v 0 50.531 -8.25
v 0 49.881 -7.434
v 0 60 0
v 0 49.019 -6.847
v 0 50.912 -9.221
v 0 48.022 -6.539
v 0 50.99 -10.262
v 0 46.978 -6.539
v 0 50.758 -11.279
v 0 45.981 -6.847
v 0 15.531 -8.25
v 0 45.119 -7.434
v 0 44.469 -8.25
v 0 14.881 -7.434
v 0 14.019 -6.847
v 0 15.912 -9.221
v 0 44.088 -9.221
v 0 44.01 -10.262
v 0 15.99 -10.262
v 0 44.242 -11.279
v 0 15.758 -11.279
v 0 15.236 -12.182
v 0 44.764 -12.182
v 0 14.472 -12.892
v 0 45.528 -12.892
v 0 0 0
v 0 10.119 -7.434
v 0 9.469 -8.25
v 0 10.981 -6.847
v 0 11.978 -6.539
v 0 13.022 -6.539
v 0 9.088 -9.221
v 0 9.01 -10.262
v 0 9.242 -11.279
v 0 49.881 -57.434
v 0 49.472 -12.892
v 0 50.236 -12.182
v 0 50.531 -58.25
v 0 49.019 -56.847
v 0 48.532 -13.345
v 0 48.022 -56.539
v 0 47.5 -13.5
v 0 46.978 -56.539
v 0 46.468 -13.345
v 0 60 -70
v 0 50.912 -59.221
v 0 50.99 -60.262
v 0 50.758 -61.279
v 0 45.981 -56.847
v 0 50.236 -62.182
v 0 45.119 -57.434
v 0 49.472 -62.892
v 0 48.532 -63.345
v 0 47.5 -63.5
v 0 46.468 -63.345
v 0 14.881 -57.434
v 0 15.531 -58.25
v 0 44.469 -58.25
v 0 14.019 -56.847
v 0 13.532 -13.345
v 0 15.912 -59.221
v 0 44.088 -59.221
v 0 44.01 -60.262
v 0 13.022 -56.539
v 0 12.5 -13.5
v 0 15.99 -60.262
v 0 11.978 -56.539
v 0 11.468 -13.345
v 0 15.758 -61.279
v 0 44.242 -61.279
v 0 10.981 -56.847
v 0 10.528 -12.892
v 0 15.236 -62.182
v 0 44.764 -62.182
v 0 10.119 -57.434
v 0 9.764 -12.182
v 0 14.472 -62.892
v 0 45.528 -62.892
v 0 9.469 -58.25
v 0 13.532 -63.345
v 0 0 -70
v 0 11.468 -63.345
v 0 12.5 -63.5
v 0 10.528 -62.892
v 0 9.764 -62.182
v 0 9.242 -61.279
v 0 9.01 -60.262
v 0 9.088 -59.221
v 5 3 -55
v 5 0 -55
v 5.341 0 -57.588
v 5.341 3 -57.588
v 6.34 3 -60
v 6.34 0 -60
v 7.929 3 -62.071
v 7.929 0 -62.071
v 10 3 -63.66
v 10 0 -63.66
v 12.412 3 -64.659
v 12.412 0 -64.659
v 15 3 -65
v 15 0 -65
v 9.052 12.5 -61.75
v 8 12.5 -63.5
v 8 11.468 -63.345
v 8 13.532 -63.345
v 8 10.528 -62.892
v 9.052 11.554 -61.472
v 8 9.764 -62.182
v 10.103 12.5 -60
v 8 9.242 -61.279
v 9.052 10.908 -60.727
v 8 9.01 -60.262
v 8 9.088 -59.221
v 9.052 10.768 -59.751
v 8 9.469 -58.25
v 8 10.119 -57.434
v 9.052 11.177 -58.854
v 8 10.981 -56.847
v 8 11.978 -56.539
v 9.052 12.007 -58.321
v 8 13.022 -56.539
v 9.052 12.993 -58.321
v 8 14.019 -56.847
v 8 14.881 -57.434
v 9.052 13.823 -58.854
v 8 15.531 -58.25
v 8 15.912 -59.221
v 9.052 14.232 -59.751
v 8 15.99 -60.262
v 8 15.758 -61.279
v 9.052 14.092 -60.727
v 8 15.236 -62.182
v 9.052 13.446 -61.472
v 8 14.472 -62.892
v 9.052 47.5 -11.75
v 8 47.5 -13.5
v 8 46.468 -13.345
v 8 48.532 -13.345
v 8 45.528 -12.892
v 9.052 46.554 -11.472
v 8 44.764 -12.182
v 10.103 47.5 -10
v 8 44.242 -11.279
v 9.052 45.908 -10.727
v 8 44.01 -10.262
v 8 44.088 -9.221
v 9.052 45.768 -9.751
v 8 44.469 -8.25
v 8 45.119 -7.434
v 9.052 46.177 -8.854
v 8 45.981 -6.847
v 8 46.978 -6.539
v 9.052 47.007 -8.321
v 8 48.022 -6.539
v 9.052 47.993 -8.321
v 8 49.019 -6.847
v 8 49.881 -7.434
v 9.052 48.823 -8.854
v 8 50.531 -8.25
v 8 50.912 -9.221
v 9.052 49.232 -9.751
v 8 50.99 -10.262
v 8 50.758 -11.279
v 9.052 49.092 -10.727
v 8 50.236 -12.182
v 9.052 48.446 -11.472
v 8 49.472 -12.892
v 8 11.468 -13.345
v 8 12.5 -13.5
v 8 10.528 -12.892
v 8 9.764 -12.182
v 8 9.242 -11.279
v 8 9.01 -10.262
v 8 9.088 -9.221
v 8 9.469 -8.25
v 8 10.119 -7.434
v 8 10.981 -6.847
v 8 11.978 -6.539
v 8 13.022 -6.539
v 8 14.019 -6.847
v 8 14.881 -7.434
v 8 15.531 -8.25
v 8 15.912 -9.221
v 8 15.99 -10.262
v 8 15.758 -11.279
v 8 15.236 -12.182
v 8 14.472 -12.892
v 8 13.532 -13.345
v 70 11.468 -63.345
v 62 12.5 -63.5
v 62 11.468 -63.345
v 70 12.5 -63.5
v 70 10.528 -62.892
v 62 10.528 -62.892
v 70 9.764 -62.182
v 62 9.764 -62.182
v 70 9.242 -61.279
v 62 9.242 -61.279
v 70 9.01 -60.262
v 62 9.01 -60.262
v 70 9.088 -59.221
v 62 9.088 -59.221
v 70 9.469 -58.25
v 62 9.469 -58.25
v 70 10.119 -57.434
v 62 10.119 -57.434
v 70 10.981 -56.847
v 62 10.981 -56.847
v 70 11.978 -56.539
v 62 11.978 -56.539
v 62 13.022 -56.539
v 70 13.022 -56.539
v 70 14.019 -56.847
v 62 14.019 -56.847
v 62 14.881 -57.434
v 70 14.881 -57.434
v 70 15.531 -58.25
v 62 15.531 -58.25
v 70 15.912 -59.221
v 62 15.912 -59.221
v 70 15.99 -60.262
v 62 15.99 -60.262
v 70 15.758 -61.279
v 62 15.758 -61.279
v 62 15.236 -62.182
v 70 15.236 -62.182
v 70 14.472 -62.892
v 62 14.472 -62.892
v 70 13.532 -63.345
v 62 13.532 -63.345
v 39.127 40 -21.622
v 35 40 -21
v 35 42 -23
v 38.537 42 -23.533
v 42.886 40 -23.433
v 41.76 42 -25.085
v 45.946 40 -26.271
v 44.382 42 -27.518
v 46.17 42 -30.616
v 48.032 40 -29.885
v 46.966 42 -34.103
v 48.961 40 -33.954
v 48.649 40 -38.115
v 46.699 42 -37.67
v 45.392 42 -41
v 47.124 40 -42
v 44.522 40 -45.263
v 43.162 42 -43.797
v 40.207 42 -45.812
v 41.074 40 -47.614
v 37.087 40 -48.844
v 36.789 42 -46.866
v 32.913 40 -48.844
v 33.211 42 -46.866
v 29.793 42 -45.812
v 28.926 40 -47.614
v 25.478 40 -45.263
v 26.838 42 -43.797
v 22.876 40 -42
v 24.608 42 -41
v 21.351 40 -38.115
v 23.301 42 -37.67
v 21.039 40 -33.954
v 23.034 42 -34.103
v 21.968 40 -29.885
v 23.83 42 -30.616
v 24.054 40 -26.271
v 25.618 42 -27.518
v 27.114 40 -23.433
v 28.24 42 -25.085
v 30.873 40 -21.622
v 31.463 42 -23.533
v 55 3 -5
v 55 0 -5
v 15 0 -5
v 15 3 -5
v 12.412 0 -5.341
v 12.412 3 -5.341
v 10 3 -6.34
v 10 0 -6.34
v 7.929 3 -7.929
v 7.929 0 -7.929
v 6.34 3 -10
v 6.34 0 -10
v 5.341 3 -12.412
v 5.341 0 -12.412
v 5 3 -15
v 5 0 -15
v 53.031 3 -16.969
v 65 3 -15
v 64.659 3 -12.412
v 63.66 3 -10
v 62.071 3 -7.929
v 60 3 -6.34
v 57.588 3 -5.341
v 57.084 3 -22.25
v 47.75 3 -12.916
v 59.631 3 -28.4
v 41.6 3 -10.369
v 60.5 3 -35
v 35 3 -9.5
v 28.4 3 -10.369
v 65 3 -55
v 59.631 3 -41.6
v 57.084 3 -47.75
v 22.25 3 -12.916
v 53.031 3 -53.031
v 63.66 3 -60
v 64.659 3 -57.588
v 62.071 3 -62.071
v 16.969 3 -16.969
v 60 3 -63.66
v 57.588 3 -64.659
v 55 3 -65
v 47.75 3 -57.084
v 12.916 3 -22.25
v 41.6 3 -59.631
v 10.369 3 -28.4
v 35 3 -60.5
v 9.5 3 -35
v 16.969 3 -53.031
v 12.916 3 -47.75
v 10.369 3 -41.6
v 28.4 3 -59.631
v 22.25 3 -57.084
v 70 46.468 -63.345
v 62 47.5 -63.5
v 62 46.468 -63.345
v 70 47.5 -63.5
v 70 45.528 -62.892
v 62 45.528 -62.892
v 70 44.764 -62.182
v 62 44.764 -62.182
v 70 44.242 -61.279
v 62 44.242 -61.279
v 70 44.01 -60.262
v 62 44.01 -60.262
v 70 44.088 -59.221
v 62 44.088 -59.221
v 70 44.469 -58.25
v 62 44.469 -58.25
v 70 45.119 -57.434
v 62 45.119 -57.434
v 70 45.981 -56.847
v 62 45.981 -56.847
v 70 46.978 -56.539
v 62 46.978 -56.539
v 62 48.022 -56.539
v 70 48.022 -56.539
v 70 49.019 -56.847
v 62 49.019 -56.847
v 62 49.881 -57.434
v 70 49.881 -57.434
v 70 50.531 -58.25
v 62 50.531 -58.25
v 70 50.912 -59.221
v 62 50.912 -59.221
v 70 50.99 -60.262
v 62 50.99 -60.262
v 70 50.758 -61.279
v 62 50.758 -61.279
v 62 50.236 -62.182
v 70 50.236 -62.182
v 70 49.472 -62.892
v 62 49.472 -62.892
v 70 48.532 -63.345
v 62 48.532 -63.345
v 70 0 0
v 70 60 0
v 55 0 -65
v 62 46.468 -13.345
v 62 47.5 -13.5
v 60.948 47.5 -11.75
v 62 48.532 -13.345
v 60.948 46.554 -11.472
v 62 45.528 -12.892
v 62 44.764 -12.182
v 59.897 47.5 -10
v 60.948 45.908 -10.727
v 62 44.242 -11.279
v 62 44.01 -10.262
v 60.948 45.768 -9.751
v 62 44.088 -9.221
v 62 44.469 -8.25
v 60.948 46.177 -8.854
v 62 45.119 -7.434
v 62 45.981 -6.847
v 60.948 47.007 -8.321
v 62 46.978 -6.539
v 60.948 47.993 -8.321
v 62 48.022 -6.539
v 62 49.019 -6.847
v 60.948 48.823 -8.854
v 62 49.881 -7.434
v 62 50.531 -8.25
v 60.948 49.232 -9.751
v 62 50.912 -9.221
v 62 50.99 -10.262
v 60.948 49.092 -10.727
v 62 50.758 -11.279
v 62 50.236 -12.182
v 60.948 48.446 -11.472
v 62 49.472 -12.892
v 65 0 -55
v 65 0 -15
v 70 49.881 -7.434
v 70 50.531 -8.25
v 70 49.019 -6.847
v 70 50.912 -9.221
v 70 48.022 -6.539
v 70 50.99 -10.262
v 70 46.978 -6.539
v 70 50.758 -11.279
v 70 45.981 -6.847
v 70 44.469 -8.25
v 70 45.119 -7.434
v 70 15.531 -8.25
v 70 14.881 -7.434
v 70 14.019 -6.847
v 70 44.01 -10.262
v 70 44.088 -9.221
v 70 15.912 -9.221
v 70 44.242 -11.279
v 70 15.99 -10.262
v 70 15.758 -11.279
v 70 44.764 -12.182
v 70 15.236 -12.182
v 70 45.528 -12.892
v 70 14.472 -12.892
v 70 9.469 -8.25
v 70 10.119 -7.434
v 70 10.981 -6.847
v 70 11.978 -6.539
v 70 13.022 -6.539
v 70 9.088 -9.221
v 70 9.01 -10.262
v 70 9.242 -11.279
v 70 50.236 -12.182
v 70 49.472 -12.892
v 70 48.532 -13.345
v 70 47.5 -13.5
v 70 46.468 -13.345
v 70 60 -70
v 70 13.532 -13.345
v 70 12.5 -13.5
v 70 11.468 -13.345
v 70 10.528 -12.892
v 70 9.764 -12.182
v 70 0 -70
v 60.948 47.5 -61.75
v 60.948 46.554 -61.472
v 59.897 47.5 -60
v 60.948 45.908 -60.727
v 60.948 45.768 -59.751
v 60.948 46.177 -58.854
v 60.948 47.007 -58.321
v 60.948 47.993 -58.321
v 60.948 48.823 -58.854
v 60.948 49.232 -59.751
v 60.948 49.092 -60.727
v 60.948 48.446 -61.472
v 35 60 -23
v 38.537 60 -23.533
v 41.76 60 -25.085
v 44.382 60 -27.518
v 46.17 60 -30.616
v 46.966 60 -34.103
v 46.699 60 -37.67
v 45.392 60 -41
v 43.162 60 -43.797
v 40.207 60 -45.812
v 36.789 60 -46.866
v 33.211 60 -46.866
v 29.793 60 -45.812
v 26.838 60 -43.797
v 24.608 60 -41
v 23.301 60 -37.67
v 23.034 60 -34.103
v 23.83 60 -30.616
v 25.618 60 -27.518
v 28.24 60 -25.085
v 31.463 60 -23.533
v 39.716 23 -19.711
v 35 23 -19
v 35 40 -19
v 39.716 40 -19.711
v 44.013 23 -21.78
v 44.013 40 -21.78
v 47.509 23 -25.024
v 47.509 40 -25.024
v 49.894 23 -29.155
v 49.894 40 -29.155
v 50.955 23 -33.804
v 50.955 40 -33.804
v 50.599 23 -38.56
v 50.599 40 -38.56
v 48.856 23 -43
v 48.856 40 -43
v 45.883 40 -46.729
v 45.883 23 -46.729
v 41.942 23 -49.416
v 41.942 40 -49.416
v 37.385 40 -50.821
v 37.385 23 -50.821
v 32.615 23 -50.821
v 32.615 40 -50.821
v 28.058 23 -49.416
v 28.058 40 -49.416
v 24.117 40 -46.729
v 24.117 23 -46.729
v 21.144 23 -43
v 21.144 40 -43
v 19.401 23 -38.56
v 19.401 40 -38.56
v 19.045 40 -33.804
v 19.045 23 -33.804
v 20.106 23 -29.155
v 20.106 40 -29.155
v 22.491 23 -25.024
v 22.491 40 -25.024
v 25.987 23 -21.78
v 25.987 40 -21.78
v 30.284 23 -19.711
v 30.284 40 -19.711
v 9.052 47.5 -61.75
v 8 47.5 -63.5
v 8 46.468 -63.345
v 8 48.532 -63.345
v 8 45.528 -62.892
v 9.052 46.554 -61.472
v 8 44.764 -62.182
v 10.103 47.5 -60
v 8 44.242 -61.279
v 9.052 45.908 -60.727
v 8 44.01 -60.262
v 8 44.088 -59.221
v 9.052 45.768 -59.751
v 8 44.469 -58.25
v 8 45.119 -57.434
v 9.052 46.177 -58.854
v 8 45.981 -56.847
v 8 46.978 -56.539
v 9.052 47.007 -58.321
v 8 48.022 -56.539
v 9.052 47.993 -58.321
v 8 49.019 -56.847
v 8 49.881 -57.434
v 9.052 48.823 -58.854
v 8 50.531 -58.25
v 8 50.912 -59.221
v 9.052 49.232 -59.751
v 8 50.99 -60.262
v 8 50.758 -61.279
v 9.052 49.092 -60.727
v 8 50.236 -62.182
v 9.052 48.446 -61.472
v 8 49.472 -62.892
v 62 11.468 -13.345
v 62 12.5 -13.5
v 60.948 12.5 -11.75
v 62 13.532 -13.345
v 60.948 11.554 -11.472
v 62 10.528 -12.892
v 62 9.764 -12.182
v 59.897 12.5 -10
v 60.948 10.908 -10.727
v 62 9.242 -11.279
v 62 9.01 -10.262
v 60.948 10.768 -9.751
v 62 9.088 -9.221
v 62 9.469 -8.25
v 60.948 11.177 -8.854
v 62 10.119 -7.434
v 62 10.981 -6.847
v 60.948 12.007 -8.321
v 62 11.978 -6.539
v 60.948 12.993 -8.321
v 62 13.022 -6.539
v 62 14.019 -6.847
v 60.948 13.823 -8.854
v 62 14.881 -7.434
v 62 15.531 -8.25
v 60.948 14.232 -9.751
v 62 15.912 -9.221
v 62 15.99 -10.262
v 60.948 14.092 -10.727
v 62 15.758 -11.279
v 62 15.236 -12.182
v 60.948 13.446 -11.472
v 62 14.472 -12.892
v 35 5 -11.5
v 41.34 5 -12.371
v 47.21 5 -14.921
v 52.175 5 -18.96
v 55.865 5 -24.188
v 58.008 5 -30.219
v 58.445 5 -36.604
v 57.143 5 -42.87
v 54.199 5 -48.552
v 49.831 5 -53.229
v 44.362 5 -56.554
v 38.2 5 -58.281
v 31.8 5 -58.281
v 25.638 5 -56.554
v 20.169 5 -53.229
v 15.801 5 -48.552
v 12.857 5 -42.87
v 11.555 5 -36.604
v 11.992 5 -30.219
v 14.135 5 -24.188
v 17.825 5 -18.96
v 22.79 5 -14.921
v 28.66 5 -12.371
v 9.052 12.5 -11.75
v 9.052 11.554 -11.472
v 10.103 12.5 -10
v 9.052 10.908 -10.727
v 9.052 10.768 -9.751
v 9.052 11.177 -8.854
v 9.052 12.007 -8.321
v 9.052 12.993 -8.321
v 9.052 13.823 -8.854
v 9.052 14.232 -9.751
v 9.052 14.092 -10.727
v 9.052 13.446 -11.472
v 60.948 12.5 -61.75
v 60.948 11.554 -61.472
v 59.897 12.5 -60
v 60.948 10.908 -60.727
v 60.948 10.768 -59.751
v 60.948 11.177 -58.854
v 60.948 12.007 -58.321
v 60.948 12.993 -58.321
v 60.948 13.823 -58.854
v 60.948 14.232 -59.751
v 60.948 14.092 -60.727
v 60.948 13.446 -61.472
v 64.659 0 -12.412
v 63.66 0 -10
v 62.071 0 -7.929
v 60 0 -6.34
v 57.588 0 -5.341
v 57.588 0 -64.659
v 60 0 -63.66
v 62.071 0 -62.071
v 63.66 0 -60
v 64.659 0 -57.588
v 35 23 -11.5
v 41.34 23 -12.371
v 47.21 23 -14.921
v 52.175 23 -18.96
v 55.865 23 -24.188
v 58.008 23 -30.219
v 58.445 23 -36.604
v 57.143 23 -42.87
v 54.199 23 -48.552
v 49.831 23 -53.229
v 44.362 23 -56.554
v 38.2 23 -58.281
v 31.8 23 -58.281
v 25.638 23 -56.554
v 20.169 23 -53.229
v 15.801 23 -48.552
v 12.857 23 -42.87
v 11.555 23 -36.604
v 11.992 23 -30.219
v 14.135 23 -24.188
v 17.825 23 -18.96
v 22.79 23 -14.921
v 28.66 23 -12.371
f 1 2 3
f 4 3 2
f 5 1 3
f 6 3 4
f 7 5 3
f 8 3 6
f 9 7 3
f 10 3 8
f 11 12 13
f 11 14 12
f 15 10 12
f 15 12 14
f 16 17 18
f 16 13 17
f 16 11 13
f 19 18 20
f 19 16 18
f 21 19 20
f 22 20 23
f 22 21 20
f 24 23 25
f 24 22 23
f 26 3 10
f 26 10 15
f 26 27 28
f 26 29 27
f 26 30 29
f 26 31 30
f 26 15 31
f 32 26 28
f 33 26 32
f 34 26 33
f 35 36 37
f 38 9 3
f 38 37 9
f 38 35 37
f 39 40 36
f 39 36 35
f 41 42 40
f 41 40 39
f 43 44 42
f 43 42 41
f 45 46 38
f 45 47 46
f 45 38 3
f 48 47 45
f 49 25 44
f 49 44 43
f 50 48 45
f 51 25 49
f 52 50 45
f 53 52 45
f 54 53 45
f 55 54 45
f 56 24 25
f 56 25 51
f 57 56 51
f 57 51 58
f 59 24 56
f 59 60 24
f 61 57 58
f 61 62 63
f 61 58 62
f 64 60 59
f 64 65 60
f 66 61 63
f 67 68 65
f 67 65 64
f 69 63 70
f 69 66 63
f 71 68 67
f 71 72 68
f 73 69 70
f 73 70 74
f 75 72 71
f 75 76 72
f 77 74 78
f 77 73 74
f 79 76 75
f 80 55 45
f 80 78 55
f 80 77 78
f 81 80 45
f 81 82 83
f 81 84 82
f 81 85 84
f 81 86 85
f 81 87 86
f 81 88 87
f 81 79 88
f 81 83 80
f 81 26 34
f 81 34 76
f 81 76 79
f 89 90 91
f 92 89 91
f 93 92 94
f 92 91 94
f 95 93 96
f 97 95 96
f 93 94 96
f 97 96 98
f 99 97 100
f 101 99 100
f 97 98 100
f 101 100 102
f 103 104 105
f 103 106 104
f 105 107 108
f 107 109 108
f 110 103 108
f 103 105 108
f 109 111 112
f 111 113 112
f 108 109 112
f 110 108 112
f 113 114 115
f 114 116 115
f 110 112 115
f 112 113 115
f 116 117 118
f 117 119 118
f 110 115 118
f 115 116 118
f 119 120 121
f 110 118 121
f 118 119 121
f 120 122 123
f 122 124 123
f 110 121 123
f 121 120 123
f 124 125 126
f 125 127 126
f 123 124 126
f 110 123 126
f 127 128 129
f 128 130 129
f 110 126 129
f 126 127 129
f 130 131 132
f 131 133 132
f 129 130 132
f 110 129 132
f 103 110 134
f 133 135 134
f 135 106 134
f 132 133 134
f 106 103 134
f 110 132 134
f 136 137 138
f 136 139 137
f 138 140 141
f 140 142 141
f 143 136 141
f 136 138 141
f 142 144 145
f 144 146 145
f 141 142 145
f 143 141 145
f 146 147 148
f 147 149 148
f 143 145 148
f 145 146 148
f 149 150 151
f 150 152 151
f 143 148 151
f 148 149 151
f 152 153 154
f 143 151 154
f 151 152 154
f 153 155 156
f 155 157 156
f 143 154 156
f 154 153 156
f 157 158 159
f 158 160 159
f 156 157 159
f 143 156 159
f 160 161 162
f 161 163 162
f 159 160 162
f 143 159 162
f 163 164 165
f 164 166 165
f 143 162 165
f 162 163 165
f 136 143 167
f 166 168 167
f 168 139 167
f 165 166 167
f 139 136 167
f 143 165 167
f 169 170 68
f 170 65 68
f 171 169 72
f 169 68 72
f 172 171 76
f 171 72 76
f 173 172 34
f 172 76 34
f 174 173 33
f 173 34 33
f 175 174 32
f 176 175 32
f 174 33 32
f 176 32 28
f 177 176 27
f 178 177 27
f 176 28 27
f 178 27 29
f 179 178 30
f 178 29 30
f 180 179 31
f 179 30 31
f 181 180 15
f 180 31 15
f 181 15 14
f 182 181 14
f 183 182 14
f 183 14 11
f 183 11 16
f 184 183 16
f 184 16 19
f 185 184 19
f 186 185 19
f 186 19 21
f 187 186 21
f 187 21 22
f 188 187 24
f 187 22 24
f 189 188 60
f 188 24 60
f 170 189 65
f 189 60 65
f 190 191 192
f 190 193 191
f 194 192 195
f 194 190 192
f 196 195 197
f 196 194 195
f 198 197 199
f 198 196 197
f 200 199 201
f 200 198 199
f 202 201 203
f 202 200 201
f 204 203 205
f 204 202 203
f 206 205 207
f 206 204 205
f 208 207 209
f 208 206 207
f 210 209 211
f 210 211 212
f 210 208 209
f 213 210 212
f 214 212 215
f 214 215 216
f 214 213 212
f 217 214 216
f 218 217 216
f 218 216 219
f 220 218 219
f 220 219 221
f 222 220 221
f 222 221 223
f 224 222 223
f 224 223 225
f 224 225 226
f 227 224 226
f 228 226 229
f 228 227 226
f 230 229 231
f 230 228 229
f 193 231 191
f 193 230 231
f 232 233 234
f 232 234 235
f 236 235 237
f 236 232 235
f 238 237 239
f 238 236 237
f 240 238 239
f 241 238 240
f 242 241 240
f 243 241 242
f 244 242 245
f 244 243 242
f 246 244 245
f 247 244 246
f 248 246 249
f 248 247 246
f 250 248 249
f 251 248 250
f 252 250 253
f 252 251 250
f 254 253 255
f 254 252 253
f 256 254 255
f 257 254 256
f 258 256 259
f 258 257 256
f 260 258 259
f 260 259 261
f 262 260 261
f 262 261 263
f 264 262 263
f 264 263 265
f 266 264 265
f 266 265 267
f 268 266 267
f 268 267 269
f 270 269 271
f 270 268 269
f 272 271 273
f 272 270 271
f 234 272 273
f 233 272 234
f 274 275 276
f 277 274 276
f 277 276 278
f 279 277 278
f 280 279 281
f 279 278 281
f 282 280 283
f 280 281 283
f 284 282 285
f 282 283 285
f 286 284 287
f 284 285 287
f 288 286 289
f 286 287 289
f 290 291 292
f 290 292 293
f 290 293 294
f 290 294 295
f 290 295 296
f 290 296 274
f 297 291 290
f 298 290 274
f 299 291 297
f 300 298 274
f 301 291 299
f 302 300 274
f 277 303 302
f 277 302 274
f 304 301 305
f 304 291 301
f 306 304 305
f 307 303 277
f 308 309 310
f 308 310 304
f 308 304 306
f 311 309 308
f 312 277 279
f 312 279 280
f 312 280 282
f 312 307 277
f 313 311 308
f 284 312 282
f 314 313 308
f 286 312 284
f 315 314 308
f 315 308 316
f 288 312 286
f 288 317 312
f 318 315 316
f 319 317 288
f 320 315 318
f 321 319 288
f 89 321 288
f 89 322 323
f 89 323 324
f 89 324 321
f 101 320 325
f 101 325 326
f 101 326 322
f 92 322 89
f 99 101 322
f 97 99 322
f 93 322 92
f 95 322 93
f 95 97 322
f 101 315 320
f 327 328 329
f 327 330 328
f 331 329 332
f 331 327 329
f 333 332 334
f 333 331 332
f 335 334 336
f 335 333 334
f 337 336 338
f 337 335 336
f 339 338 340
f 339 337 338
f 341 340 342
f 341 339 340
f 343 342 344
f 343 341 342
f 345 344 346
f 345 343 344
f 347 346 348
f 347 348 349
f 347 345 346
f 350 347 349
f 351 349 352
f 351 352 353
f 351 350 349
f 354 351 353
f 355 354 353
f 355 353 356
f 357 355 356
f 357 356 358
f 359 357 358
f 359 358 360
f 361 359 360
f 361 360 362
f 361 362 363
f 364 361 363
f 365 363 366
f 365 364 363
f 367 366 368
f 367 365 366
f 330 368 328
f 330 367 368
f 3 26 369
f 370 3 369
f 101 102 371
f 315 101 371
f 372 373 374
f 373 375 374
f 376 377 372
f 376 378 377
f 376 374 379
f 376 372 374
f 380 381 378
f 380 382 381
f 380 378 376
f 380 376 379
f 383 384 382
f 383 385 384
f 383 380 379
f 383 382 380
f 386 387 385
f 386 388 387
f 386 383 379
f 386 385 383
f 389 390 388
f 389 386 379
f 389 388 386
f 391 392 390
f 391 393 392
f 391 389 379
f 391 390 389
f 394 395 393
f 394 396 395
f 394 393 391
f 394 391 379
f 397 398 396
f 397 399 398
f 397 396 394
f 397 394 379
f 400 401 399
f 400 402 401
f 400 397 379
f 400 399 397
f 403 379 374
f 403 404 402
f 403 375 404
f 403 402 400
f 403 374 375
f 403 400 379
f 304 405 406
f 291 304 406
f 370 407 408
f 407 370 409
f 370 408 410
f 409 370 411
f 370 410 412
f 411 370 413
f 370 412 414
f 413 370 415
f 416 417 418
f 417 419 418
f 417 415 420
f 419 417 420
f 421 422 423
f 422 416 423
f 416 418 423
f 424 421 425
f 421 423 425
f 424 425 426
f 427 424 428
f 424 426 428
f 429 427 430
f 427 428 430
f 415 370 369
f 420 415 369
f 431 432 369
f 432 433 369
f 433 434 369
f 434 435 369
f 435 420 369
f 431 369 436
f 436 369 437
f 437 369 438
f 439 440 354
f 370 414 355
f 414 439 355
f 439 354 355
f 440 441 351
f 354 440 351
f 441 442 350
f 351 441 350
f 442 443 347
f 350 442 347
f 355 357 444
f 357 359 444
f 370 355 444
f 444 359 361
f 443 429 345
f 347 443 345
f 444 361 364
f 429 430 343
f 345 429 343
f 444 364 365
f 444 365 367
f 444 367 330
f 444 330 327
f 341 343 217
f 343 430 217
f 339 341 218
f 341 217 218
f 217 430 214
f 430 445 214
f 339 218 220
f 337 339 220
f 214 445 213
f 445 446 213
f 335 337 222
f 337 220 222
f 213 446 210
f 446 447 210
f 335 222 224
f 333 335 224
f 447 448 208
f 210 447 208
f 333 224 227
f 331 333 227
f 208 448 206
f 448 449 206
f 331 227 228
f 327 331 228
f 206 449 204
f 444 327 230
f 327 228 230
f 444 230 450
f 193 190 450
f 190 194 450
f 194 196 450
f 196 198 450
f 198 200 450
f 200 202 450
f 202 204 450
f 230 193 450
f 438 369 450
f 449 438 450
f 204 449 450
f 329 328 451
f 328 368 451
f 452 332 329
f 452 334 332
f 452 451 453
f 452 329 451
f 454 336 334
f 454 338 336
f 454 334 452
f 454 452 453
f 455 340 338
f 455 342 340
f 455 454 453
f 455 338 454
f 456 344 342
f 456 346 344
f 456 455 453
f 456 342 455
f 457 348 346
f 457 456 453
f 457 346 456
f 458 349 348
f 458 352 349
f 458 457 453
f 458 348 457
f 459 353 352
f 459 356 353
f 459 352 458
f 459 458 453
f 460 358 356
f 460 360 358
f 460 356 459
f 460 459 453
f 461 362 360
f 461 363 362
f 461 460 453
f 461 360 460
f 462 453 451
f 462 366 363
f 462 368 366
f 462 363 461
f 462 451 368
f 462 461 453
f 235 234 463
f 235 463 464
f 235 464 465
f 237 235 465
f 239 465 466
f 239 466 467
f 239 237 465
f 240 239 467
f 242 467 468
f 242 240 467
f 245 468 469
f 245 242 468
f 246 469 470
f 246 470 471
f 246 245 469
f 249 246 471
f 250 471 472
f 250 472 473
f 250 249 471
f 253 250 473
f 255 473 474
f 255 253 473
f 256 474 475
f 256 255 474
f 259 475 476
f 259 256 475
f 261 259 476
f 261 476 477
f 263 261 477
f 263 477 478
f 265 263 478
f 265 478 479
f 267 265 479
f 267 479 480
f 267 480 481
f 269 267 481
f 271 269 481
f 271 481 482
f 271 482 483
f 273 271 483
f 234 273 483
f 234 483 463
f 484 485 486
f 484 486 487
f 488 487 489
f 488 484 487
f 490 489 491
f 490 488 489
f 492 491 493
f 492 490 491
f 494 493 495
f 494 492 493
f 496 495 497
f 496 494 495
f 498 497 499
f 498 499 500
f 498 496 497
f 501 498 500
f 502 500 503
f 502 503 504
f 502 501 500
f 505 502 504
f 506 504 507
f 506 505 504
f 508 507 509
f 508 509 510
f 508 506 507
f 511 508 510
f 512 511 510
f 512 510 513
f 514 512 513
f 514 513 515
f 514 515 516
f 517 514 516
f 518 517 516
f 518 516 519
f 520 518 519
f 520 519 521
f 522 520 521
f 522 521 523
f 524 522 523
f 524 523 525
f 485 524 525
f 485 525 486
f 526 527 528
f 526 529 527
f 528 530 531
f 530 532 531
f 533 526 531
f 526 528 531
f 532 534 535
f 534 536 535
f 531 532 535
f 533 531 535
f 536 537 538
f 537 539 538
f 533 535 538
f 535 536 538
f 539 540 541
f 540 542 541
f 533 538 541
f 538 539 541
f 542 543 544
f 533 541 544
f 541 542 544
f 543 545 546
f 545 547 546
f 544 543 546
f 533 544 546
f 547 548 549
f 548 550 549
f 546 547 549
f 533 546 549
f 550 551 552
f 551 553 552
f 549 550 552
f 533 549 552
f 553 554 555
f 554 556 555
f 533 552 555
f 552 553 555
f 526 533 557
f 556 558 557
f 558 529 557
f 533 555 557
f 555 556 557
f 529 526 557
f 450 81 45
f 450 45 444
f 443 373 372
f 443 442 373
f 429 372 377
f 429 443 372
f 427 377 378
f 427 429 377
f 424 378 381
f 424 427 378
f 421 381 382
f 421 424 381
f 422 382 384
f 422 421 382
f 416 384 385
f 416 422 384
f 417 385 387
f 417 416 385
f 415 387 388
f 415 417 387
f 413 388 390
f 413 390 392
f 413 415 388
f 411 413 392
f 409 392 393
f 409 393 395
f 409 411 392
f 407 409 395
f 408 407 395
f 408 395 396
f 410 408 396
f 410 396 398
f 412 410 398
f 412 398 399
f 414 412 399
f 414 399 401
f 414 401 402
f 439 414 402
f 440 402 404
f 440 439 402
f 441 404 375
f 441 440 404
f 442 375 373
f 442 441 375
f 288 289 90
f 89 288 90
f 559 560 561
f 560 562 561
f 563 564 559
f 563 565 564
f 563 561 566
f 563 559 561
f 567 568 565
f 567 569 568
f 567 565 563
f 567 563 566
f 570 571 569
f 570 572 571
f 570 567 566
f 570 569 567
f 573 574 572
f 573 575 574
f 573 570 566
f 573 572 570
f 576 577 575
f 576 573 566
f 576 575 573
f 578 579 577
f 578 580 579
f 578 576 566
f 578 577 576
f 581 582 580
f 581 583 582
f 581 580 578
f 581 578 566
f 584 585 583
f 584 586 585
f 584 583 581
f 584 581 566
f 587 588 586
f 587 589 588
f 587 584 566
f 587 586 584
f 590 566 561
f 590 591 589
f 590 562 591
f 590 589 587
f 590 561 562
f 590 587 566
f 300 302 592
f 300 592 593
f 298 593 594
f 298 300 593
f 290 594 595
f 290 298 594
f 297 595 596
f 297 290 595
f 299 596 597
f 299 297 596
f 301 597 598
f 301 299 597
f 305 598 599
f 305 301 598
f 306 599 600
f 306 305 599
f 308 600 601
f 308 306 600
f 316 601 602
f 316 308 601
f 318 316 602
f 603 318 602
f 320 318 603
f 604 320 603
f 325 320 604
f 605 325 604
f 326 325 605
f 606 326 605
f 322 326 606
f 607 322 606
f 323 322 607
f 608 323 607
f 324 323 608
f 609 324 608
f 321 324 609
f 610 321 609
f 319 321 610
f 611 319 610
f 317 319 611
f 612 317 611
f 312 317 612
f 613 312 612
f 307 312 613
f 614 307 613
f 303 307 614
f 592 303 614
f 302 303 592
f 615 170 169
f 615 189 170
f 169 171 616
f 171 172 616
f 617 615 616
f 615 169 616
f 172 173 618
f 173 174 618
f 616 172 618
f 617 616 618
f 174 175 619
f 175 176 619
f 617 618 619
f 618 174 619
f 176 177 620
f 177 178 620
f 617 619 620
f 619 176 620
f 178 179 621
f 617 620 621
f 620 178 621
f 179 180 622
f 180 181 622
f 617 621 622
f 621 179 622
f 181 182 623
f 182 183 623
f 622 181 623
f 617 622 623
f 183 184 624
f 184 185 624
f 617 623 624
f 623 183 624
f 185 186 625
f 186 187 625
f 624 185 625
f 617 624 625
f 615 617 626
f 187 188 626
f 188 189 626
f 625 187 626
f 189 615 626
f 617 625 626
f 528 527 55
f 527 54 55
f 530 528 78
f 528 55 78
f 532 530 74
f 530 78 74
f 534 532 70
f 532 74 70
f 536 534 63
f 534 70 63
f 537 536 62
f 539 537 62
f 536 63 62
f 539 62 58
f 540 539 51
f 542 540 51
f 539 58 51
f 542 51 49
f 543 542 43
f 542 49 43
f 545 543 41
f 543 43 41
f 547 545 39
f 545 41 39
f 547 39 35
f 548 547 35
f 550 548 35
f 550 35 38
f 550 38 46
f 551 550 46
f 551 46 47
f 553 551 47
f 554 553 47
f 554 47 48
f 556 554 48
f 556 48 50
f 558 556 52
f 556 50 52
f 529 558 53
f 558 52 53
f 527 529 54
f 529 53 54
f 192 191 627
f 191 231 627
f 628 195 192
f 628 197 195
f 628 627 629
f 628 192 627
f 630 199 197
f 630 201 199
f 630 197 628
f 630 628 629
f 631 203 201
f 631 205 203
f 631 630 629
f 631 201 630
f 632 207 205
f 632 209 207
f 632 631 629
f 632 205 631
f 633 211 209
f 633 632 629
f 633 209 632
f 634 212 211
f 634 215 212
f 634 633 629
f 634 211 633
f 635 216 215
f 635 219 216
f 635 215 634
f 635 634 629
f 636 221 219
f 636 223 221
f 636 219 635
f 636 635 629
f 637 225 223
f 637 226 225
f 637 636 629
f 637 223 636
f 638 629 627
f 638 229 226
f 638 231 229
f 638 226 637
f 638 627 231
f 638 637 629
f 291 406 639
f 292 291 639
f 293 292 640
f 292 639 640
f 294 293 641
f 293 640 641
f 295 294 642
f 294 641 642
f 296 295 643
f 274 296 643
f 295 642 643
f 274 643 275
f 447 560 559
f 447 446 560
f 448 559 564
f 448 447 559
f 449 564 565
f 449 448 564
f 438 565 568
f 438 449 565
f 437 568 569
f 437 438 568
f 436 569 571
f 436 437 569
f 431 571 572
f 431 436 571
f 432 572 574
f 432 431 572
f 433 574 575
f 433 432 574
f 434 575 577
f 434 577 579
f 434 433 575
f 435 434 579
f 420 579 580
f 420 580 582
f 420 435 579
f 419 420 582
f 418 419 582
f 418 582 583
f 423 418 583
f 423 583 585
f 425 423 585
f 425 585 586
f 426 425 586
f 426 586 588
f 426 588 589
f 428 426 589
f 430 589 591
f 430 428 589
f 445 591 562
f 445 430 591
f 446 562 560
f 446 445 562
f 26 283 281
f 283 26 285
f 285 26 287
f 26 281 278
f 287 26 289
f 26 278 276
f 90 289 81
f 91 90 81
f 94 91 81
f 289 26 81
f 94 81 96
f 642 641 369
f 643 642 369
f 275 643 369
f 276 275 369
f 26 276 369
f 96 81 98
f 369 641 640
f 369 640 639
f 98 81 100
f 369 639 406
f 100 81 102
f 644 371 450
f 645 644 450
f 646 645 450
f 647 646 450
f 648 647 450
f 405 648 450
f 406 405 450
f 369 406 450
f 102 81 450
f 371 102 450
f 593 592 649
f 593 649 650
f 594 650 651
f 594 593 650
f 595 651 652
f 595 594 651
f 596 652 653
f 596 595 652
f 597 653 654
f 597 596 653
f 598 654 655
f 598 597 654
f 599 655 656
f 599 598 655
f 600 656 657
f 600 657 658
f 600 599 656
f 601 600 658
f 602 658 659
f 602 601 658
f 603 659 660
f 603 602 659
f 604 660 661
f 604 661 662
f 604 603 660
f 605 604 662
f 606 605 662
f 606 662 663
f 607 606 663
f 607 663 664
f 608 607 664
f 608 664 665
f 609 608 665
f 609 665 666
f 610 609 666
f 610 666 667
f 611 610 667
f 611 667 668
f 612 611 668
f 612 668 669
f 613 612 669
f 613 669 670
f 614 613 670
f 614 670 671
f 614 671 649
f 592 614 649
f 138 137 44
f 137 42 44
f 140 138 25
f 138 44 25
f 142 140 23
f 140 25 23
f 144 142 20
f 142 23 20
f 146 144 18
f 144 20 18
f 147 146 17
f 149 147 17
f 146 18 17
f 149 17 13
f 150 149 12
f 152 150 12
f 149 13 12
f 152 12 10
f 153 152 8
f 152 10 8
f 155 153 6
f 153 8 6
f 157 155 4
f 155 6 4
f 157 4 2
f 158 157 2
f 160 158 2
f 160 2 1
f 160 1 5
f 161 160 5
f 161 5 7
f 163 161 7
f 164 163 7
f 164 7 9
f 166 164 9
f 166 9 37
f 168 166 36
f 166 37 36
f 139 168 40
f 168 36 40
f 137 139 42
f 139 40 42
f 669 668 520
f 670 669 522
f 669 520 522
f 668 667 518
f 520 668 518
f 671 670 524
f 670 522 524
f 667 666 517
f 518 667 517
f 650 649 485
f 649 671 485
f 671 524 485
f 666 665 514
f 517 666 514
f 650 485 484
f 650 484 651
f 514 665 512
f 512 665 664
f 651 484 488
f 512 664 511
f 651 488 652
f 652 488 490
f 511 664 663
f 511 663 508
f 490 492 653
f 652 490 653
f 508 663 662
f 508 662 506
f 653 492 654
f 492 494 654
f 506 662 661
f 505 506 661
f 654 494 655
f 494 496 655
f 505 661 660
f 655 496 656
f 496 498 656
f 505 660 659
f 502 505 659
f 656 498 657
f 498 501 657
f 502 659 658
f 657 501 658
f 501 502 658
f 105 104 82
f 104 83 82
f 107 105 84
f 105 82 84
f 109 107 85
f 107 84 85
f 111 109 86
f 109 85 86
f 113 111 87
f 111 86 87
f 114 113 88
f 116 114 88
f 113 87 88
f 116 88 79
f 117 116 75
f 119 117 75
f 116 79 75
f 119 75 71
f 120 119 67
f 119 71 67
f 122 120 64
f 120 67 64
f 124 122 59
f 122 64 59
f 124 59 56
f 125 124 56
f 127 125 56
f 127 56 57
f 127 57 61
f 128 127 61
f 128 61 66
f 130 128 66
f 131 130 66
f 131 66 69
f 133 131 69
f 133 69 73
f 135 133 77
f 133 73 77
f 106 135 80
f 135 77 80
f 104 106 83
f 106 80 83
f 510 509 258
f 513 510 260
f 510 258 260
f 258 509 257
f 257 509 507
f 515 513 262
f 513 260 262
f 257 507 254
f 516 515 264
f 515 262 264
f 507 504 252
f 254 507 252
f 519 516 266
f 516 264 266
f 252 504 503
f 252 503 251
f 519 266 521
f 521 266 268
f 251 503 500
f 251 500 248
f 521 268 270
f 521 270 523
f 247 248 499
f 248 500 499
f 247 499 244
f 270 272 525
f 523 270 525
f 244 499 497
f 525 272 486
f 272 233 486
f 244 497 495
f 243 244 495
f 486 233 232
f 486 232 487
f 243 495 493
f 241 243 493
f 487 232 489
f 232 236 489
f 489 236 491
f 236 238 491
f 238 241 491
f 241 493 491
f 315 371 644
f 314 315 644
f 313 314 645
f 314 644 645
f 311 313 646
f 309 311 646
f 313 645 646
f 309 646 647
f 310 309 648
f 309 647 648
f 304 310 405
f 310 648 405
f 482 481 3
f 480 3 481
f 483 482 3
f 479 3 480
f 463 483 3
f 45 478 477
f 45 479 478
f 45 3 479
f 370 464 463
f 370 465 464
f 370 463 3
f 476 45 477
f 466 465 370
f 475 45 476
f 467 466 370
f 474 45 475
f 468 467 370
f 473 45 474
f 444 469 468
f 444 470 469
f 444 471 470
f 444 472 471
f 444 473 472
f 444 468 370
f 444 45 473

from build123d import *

# Parameters (mm, degrees)
SZKIC1_W                            = 70
SZKIC1_H                            = 70
SZKIC1_R                            = 12
DODANIE_WYCI_GNI_CIE1_DEPTH         = 60
SZKIC1_3_R                          = 23.5
WYTNIJ_WYCI_GNI_CIE1_DEPTH          = 3
SZKIC1_4_R                          = 23.5
WYTNIJ_WYCI_GNI_CIE2_DEPTH          = 23
SZKIC1_6_R                          = 16
SZKIC1_6_R_2                        = 12
WYTNIJ_WYCI_GNI_CIE5_DEPTH          = 40
SFAZOWANIE1_SIZE                    = 2
SFAZOWANIE2_SIZE                    = 2
OTW_R_GWINTOWANY_M8X1_01_AT_2_COUNT = 2
OTW_R_GWINTOWANY_M8X1_01_AT_2_PITCH = 50
OTW_R_GWINTOWANY_M8X1_01_AT_3_COUNT = 2
OTW_R_GWINTOWANY_M8X1_01_AT_3_PITCH = 35
OTW_R_GWINTOWANY_M8X1_01_AT_4_COUNT = 2
OTW_R_GWINTOWANY_M8X1_01_AT_4_PITCH = 61.032778079


with BuildPart() as part:
    # Szkic1 → Dodanie-wyciągnięcie1 (new body)
    with BuildSketch(Plane(origin=(0, 0, 0), x_dir=(1, 0, 0), z_dir=(0, 1, 0))):
        with Locations((35, 35)):
            Rectangle(SZKIC1_W, SZKIC1_H)
        with Locations((35, 35)):
            Circle(SZKIC1_R, mode=Mode.SUBTRACT)
    extrude(amount=DODANIE_WYCI_GNI_CIE1_DEPTH)

    # Szkic1<3> → Wytnij-wyciągnięcie1 (cut)
    with BuildSketch(Plane(origin=(0, 0, 0), x_dir=(1, 0, 0), z_dir=(0, 1, 0))):
        with BuildLine():
            Line((5, 55), (5, 35))
            Line((5, 35), (5, 15))
            ThreePointArc((5, 15), (7.928932188, 7.928932188), (15, 5))
            Line((15, 5), (55, 5))
            ThreePointArc((55, 5), (62.071067812, 7.928932188), (65, 15))
            Line((65, 15), (65, 55))
            ThreePointArc((65, 55), (62.071067812, 62.071067812), (55, 65))
            Line((55, 65), (15, 65))
            ThreePointArc((15, 65), (7.928932188, 62.071067812), (5, 55))
        make_face()
        with Locations((35, 35)):
            Circle(SZKIC1_3_R, mode=Mode.SUBTRACT)
    extrude(amount=WYTNIJ_WYCI_GNI_CIE1_DEPTH, mode=Mode.SUBTRACT)

    # Szkic1<4> → Wytnij-wyciągnięcie2 (cut)
    with BuildSketch(Plane(origin=(0, 0, 0), x_dir=(1, 0, 0), z_dir=(0, 1, 0))):
        with Locations((35, 35)):
            Circle(SZKIC1_4_R)
    extrude(amount=WYTNIJ_WYCI_GNI_CIE2_DEPTH, mode=Mode.SUBTRACT)

    # Szkic1<6> → Wytnij-wyciągnięcie5 (cut)
    with BuildSketch(Plane(origin=(0, 0, 0), x_dir=(1, 0, 0), z_dir=(0, 1, 0))):
        with Locations((35, 35)):
            Circle(SZKIC1_6_R)
        with Locations((35, 35)):
            Circle(SZKIC1_6_R_2, mode=Mode.SUBTRACT)
    extrude(amount=WYTNIJ_WYCI_GNI_CIE5_DEPTH, mode=Mode.SUBTRACT)

    # Sfazowanie1
    sfazowanie1_edges = [part.edges().sort_by_distance(p)[0] for p in [
        (23, 40, -35),
    ]]
    chamfer(sfazowanie1_edges, length=SFAZOWANIE1_SIZE)

    # Sfazowanie2
    sfazowanie2_edges = [part.edges().sort_by_distance(p)[0] for p in [
        (11.5, 3, -35),
    ]]
    chamfer(sfazowanie2_edges, length=SFAZOWANIE2_SIZE)

    # Szkic4 → Otwór gwintowany M8x1.01 (revolve, cut)
    with BuildSketch(Plane(origin=(70, 47.5, -10), x_dir=(0, 0, -1), z_dir=(0, 1, 0))):
        Polygon((0, 0), (0, 10.103012167), (3.5, 8), (3.5, 0), align=None)
    otw_r_gwintowany_m8x1_01 = revolve(axis=Axis((76.35, 47.5, -10), (-1, 0, 0)), mode=Mode.SUBTRACT)

    # Otwór gwintowany M8x1.01 at 2: Otwór gwintowany M8x1.01 ×2
    with Locations(*[(0, 0, -i * OTW_R_GWINTOWANY_M8X1_01_AT_2_PITCH) for i in range(1, OTW_R_GWINTOWANY_M8X1_01_AT_2_COUNT)]):
        add(otw_r_gwintowany_m8x1_01, mode=Mode.SUBTRACT)

    # Otwór gwintowany M8x1.01 at 3: Otwór gwintowany M8x1.01 ×2
    with Locations(*[(0, -i * OTW_R_GWINTOWANY_M8X1_01_AT_3_PITCH, 0) for i in range(1, OTW_R_GWINTOWANY_M8X1_01_AT_3_COUNT)]):
        add(otw_r_gwintowany_m8x1_01, mode=Mode.SUBTRACT)

    # Otwór gwintowany M8x1.01 at 4: Otwór gwintowany M8x1.01 ×2
    with Locations(*[Vector(0, -0.5734623443633283, -0.8192319205190405) * (i * OTW_R_GWINTOWANY_M8X1_01_AT_4_PITCH) for i in range(1, OTW_R_GWINTOWANY_M8X1_01_AT_4_COUNT)]):
        add(otw_r_gwintowany_m8x1_01, mode=Mode.SUBTRACT)

    # Lustro1: Otwór gwintowany M8x1.01 across plane
    add(otw_r_gwintowany_m8x1_01.mirror(Plane(origin=(35, 0, 0), x_dir=(0, 0, 1), z_dir=(1, 0, 0))), mode=Mode.SUBTRACT)

    # Lustro1 copy 1 sketch → Lustro1 copy 1 (revolve, cut)
    with BuildSketch(Plane(origin=(0, 47.5, -60), x_dir=(0, 0, -1), z_dir=(0, 1, 0))):
        Polygon((0, 0), (0, -10.103012167), (3.5, -8), (3.5, 0), align=None)
    revolve(axis=Axis((-6.35, 47.5, -60), (-1, 0, 0)), mode=Mode.SUBTRACT)

    # Lustro1 copy 2 sketch → Lustro1 copy 2 (revolve, cut)
    with BuildSketch(Plane(origin=(0, 12.5, -10), x_dir=(0, 0, -1), z_dir=(0, 1, 0))):
        Polygon((0, 0), (0, -10.103012167), (3.5, -8), (3.5, 0), align=None)
    revolve(axis=Axis((-6.35, 12.5, -10), (-1, 0, 0)), mode=Mode.SUBTRACT)

    # Lustro1 copy 3 sketch → Lustro1 copy 3 (revolve, cut)
    with BuildSketch(Plane(origin=(0, 12.5, -60), x_dir=(0, 0, -1), z_dir=(0, 1, 0))):
        Polygon((0, 0), (0, -10.103012167), (3.5, -8), (3.5, 0), align=None)
    revolve(axis=Axis((-6.35, 12.5, -60), (-1, 0, 0)), mode=Mode.SUBTRACT)


solid = part.part
